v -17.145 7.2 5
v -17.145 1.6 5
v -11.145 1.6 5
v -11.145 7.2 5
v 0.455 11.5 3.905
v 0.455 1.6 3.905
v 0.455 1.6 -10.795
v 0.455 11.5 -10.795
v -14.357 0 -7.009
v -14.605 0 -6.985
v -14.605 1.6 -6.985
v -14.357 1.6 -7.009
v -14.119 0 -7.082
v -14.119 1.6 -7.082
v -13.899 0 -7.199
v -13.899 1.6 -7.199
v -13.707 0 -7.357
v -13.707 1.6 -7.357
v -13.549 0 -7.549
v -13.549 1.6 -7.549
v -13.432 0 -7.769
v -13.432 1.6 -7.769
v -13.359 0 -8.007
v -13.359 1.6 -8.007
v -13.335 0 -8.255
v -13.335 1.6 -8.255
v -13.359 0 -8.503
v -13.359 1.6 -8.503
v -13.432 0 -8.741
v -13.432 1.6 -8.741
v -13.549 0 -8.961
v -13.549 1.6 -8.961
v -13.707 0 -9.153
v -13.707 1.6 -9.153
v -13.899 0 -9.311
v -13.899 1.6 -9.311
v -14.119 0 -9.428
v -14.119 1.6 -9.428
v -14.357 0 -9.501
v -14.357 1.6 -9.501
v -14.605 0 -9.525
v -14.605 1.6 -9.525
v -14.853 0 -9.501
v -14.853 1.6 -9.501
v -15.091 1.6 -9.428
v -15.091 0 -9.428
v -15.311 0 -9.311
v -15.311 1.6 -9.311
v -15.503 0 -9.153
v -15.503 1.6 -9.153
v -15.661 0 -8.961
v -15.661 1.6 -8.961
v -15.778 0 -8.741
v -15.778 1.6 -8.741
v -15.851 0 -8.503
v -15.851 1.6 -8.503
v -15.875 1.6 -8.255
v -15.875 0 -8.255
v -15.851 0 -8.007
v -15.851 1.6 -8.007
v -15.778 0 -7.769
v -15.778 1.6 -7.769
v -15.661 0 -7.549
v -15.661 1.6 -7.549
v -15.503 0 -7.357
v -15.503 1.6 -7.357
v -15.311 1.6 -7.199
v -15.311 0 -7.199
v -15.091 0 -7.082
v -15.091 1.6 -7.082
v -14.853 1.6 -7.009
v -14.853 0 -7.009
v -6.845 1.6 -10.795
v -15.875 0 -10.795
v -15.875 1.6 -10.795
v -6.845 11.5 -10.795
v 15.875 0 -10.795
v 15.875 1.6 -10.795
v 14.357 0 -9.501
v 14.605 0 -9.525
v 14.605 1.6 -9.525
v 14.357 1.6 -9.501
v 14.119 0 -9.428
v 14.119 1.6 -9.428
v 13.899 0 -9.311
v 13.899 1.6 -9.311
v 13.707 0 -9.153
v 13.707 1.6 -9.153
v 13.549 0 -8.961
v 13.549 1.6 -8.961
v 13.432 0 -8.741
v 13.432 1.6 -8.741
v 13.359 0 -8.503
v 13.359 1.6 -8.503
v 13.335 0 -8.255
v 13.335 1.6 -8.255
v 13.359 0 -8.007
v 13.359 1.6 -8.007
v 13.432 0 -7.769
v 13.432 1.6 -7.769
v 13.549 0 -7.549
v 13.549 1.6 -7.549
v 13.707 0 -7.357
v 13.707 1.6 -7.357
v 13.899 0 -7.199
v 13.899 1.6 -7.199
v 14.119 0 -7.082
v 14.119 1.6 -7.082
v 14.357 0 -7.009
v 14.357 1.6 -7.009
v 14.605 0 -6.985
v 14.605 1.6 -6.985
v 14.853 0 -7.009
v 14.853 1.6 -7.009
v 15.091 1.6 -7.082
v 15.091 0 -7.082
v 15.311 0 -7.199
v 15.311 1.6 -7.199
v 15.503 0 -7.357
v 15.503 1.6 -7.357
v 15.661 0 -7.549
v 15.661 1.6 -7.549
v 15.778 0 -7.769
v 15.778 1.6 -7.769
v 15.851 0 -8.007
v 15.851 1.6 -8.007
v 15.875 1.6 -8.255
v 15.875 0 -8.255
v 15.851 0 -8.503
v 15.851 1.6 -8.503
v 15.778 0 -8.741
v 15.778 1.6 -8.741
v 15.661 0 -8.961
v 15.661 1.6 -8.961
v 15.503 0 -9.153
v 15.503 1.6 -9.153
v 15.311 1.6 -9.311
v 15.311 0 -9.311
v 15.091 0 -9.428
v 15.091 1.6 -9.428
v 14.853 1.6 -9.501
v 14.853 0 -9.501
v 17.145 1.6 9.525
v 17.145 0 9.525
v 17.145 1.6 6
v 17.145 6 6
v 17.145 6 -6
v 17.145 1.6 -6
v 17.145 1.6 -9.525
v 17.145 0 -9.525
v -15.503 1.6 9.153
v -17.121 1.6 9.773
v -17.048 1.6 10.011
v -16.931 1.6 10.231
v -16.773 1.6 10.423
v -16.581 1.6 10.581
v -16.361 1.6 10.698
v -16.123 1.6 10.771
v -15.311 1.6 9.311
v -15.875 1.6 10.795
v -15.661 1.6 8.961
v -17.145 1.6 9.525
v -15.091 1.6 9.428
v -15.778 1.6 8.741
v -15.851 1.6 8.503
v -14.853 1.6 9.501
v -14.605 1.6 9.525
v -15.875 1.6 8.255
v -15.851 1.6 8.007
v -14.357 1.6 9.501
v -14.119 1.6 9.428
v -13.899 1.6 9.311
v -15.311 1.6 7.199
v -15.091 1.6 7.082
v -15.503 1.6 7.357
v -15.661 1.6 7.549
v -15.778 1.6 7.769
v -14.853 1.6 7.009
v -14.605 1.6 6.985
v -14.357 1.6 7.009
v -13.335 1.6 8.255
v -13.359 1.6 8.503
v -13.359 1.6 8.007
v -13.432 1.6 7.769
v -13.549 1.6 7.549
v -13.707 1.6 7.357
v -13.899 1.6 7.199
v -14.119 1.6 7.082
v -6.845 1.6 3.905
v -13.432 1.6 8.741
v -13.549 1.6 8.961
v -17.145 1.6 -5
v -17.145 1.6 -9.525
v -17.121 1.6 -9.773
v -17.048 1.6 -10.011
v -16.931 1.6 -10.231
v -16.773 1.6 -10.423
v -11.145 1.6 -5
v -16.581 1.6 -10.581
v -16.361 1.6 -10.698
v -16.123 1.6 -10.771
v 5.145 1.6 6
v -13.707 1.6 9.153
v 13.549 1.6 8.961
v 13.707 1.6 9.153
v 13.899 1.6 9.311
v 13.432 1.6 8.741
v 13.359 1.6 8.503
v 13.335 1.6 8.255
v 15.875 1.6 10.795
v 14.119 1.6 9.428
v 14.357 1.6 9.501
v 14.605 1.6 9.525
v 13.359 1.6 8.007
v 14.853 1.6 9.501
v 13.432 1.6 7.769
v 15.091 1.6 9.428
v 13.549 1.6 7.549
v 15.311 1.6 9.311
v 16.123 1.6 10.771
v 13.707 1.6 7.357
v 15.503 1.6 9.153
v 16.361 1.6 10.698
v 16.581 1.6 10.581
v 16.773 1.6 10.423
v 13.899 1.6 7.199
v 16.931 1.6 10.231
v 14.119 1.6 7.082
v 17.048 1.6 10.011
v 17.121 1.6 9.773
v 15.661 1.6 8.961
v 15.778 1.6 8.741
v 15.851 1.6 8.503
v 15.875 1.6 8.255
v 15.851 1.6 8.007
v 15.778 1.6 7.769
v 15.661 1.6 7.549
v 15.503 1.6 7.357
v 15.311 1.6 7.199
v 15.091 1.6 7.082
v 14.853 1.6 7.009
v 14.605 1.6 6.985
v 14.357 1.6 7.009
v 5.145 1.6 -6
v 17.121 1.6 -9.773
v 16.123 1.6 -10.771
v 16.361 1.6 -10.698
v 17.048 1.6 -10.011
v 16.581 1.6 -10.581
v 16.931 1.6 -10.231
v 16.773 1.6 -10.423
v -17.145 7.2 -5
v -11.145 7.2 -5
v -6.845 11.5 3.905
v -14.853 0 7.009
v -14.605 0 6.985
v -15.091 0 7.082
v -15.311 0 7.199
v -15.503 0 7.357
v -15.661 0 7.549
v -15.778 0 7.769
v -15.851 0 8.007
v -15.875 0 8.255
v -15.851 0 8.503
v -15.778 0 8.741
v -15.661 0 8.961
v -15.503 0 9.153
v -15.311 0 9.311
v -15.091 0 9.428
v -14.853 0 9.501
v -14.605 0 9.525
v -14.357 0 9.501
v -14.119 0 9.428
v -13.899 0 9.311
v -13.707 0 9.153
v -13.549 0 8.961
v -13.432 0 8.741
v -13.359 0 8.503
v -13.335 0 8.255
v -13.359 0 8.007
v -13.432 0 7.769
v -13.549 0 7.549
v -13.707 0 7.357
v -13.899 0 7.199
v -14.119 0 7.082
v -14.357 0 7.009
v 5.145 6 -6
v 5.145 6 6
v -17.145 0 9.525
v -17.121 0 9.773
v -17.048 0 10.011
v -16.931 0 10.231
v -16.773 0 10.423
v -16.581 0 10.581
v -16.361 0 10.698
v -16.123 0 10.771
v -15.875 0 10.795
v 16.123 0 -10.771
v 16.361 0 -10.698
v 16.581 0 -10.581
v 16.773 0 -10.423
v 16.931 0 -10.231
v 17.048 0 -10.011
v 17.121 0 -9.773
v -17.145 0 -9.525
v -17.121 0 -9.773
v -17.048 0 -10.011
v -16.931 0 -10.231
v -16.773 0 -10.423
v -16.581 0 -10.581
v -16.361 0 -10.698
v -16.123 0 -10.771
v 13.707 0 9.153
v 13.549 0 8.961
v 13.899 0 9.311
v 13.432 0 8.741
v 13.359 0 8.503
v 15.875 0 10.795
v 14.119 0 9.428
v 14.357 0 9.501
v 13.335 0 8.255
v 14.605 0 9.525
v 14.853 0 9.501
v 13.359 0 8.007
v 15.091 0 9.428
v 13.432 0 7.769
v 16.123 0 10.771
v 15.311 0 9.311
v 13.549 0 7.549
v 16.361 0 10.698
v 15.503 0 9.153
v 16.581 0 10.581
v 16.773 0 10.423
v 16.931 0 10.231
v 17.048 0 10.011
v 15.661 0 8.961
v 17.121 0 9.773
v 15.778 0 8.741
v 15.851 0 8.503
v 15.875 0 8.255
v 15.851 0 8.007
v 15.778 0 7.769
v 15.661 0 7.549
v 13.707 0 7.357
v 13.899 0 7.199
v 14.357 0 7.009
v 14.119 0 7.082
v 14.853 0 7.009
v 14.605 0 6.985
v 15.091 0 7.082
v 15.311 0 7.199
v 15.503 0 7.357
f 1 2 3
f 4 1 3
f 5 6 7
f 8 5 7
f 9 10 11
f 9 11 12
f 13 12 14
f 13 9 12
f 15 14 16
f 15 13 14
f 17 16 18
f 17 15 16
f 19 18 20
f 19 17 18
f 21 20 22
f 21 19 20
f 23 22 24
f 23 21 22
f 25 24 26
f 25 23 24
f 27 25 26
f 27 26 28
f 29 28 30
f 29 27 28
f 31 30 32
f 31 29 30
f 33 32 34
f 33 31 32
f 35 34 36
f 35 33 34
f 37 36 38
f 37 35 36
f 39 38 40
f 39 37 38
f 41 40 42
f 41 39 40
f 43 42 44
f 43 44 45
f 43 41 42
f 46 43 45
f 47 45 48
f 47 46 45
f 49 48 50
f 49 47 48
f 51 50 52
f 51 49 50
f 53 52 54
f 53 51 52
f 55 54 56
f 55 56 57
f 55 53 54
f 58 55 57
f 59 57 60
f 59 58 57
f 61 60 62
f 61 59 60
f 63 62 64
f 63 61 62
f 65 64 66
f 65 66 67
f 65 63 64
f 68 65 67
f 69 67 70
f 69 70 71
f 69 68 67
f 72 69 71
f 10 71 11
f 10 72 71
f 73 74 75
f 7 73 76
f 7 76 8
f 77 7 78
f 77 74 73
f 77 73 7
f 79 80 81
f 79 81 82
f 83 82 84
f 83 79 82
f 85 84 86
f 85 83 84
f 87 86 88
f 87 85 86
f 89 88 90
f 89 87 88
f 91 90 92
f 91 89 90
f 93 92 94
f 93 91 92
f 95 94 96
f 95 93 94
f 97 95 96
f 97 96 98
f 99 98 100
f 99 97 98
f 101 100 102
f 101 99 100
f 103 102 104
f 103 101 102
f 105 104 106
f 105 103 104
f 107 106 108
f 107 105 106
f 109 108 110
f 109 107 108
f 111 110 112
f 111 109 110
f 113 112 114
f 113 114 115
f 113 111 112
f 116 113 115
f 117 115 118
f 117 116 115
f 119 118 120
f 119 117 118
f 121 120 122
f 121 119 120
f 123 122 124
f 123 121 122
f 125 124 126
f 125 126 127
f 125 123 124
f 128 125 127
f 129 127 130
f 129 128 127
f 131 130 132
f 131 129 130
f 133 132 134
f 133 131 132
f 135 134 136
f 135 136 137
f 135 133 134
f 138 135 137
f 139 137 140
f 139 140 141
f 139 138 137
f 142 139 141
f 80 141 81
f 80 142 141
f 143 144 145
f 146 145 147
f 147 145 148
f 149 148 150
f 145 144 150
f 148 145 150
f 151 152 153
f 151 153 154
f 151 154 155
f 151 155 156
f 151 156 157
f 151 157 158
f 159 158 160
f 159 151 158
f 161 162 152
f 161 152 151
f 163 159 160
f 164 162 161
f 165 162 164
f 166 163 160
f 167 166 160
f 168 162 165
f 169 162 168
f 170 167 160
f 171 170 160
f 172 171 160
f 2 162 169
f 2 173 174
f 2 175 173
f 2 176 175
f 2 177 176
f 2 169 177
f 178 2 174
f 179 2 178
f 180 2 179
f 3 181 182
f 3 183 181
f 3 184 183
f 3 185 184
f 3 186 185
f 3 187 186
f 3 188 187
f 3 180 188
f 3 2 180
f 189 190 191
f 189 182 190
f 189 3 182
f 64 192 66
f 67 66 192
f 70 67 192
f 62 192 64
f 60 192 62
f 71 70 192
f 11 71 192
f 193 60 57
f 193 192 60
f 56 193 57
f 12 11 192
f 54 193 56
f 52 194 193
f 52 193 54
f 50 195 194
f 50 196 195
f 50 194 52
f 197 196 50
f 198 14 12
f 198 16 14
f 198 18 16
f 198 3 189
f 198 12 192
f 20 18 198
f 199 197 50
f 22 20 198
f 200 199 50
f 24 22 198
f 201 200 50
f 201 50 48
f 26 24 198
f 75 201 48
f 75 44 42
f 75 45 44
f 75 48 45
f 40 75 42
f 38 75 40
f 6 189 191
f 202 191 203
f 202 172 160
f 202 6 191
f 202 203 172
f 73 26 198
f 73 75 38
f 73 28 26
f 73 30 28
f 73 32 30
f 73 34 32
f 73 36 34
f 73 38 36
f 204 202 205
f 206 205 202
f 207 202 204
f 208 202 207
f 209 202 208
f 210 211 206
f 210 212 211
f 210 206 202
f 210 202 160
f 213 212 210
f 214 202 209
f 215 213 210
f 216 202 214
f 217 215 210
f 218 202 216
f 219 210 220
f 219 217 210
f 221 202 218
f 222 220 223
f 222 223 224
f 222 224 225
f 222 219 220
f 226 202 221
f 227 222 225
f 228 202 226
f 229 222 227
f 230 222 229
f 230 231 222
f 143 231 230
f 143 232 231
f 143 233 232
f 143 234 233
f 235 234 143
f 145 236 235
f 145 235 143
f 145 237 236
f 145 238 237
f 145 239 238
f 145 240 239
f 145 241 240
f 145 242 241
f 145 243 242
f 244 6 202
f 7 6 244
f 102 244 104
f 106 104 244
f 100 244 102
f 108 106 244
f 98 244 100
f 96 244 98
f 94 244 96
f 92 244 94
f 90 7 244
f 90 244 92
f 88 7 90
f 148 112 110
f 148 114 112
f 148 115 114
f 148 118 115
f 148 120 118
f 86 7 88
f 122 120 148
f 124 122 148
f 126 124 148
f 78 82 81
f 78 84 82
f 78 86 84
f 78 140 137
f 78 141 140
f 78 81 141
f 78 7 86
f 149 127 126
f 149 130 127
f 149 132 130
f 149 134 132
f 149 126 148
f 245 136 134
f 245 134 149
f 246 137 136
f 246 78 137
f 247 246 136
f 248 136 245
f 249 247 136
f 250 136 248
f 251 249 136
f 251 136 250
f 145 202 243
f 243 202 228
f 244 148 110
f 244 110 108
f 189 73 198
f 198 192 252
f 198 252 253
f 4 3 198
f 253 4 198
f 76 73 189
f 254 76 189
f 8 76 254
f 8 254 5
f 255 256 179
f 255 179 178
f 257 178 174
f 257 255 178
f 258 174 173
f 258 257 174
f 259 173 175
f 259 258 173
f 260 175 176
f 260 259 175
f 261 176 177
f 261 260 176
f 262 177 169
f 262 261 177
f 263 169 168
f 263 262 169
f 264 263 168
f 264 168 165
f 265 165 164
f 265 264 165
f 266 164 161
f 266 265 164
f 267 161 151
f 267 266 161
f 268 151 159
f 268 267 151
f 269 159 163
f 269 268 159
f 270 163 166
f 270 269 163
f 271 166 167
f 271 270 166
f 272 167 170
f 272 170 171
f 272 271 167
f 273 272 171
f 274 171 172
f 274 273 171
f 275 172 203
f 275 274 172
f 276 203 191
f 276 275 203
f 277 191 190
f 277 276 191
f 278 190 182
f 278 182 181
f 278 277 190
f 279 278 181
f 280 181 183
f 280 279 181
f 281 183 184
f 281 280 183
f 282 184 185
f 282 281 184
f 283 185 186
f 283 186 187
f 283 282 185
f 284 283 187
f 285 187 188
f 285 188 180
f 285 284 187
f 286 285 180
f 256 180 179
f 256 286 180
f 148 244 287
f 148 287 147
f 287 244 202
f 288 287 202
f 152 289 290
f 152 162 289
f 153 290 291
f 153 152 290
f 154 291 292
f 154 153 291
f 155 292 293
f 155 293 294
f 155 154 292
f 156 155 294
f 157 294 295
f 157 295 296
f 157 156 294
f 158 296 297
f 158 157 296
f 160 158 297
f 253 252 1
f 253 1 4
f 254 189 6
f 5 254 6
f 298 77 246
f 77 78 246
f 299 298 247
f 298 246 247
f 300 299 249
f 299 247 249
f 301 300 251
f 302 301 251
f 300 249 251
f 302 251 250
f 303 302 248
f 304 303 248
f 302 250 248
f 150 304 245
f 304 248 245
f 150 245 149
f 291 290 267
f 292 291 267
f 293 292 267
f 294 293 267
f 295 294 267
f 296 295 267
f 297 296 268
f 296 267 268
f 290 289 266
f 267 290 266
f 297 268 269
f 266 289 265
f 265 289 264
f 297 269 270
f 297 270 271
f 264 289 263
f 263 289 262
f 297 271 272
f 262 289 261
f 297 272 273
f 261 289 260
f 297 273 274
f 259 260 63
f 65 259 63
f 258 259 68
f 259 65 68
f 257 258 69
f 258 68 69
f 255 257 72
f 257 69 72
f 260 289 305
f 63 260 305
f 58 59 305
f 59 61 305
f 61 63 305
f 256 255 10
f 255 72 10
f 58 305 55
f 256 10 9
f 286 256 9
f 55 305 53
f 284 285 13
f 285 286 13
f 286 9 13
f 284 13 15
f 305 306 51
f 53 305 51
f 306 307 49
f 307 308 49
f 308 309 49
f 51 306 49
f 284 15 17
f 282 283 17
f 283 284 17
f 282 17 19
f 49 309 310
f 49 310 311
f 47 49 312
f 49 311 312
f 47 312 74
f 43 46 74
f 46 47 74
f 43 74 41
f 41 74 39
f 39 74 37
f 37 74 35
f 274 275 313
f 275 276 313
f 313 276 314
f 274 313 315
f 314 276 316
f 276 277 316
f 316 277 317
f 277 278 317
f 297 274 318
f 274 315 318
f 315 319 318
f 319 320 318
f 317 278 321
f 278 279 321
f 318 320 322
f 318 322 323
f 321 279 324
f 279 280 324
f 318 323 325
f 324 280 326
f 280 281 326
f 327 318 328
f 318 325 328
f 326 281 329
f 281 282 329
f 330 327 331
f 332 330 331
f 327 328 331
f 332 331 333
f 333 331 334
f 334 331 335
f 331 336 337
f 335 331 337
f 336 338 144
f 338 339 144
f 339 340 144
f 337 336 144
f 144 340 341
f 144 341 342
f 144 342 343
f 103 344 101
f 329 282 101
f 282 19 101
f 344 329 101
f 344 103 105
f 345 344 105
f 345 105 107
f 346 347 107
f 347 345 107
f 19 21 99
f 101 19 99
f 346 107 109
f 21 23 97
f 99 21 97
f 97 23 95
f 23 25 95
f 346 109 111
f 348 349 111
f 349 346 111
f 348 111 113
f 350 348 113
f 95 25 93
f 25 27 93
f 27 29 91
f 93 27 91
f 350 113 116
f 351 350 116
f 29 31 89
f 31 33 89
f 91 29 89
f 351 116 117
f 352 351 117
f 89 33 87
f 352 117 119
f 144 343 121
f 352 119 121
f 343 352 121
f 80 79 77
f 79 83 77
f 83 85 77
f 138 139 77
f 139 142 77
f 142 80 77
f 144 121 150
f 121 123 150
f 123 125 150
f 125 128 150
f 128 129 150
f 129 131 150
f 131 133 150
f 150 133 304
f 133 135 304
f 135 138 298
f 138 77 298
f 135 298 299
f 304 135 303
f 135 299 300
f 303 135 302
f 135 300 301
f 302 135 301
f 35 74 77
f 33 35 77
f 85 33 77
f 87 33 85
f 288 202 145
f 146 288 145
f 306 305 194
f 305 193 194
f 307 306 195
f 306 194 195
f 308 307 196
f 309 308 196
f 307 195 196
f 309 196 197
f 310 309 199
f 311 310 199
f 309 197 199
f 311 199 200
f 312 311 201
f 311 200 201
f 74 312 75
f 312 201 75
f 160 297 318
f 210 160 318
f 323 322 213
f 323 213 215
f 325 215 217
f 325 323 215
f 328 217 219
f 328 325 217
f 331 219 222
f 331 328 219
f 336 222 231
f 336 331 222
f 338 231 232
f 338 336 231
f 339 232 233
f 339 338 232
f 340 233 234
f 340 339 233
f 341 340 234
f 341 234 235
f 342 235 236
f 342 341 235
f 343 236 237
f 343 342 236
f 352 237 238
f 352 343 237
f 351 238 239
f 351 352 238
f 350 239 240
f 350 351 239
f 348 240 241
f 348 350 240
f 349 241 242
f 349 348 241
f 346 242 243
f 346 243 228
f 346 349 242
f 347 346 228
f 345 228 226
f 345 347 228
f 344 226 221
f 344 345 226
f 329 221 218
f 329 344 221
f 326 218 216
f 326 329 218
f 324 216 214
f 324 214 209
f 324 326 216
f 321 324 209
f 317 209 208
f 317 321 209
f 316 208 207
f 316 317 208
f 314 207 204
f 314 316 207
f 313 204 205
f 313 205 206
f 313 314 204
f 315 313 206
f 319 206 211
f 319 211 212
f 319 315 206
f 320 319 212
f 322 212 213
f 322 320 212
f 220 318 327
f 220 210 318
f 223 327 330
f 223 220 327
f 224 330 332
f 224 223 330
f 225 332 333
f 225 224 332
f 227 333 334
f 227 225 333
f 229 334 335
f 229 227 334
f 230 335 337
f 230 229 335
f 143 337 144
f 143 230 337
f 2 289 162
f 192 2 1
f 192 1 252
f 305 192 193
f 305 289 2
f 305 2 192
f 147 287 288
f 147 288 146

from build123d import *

# Parameters (mm, degrees)
SKETCH2_W                 = 34.29
SKETCH2_H                 = 21.59
SKETCH2_R                 = 1.27
PCB_DEPTH                 = 1.6
FILLET1_R                 = 1.27
SKETCH3_W                 = 6
SKETCH3_H                 = 10
CONTROL_CONNECTOR_DEPTH   = 5.6
SKETCH3_3_W               = 12
SKETCH3_3_H               = 12
ELECTRODE_CONNECTOR_DEPTH = 4.4
SKETCH3_4_W               = 7.3
SKETCH3_4_H               = 14.7
RELAY_DEPTH               = 9.9


with BuildPart() as part:
    # Sketch2 → PCB (new body)
    with BuildSketch(Plane(origin=(0, 0, 0), x_dir=(1, 0, 0), z_dir=(0, 1, 0))):
        Rectangle(SKETCH2_W, SKETCH2_H)
        with Locations((-14.605, 8.255)):
            Circle(SKETCH2_R, mode=Mode.SUBTRACT)
        with Locations((14.605, 8.255)):
            Circle(SKETCH2_R, mode=Mode.SUBTRACT)
        with Locations((14.605, -8.255)):
            Circle(SKETCH2_R, mode=Mode.SUBTRACT)
        with Locations((-14.605, -8.255)):
            Circle(SKETCH2_R, mode=Mode.SUBTRACT)
    extrude(amount=PCB_DEPTH)

    # Fillet1
    fillet1_edges = [part.edges().sort_by_distance(p)[0] for p in [
        (-17.145, 0.8, -10.795),
        (17.145, 0.8, -10.795),
        (17.145, 0.8, 10.795),
        (-17.145, 0.8, 10.795),
    ]]
    fillet(fillet1_edges, radius=FILLET1_R)

    # Sketch3 → Control_connector (add)
    with BuildSketch(Plane(origin=(0, 1.6, 0), x_dir=(1, 0, 0), z_dir=(0, 1, 0))):
        with Locations((-14.145, 0)):
            Rectangle(SKETCH3_W, SKETCH3_H)
    extrude(amount=CONTROL_CONNECTOR_DEPTH)

    # Sketch3<3> → Electrode_connector (add)
    with BuildSketch(Plane(origin=(0, 1.6, 0), x_dir=(1, 0, 0), z_dir=(0, 1, 0))):
        with Locations((11.145, 0)):
            Rectangle(SKETCH3_3_W, SKETCH3_3_H)
    extrude(amount=ELECTRODE_CONNECTOR_DEPTH)

    # Sketch3<4> → Relay (add)
    with BuildSketch(Plane(origin=(0, 1.6, 0), x_dir=(1, 0, 0), z_dir=(0, 1, 0))):
        with Locations((-3.195, 3.445)):
            Rectangle(SKETCH3_4_W, SKETCH3_4_H)
    extrude(amount=RELAY_DEPTH)


solid = part.part
